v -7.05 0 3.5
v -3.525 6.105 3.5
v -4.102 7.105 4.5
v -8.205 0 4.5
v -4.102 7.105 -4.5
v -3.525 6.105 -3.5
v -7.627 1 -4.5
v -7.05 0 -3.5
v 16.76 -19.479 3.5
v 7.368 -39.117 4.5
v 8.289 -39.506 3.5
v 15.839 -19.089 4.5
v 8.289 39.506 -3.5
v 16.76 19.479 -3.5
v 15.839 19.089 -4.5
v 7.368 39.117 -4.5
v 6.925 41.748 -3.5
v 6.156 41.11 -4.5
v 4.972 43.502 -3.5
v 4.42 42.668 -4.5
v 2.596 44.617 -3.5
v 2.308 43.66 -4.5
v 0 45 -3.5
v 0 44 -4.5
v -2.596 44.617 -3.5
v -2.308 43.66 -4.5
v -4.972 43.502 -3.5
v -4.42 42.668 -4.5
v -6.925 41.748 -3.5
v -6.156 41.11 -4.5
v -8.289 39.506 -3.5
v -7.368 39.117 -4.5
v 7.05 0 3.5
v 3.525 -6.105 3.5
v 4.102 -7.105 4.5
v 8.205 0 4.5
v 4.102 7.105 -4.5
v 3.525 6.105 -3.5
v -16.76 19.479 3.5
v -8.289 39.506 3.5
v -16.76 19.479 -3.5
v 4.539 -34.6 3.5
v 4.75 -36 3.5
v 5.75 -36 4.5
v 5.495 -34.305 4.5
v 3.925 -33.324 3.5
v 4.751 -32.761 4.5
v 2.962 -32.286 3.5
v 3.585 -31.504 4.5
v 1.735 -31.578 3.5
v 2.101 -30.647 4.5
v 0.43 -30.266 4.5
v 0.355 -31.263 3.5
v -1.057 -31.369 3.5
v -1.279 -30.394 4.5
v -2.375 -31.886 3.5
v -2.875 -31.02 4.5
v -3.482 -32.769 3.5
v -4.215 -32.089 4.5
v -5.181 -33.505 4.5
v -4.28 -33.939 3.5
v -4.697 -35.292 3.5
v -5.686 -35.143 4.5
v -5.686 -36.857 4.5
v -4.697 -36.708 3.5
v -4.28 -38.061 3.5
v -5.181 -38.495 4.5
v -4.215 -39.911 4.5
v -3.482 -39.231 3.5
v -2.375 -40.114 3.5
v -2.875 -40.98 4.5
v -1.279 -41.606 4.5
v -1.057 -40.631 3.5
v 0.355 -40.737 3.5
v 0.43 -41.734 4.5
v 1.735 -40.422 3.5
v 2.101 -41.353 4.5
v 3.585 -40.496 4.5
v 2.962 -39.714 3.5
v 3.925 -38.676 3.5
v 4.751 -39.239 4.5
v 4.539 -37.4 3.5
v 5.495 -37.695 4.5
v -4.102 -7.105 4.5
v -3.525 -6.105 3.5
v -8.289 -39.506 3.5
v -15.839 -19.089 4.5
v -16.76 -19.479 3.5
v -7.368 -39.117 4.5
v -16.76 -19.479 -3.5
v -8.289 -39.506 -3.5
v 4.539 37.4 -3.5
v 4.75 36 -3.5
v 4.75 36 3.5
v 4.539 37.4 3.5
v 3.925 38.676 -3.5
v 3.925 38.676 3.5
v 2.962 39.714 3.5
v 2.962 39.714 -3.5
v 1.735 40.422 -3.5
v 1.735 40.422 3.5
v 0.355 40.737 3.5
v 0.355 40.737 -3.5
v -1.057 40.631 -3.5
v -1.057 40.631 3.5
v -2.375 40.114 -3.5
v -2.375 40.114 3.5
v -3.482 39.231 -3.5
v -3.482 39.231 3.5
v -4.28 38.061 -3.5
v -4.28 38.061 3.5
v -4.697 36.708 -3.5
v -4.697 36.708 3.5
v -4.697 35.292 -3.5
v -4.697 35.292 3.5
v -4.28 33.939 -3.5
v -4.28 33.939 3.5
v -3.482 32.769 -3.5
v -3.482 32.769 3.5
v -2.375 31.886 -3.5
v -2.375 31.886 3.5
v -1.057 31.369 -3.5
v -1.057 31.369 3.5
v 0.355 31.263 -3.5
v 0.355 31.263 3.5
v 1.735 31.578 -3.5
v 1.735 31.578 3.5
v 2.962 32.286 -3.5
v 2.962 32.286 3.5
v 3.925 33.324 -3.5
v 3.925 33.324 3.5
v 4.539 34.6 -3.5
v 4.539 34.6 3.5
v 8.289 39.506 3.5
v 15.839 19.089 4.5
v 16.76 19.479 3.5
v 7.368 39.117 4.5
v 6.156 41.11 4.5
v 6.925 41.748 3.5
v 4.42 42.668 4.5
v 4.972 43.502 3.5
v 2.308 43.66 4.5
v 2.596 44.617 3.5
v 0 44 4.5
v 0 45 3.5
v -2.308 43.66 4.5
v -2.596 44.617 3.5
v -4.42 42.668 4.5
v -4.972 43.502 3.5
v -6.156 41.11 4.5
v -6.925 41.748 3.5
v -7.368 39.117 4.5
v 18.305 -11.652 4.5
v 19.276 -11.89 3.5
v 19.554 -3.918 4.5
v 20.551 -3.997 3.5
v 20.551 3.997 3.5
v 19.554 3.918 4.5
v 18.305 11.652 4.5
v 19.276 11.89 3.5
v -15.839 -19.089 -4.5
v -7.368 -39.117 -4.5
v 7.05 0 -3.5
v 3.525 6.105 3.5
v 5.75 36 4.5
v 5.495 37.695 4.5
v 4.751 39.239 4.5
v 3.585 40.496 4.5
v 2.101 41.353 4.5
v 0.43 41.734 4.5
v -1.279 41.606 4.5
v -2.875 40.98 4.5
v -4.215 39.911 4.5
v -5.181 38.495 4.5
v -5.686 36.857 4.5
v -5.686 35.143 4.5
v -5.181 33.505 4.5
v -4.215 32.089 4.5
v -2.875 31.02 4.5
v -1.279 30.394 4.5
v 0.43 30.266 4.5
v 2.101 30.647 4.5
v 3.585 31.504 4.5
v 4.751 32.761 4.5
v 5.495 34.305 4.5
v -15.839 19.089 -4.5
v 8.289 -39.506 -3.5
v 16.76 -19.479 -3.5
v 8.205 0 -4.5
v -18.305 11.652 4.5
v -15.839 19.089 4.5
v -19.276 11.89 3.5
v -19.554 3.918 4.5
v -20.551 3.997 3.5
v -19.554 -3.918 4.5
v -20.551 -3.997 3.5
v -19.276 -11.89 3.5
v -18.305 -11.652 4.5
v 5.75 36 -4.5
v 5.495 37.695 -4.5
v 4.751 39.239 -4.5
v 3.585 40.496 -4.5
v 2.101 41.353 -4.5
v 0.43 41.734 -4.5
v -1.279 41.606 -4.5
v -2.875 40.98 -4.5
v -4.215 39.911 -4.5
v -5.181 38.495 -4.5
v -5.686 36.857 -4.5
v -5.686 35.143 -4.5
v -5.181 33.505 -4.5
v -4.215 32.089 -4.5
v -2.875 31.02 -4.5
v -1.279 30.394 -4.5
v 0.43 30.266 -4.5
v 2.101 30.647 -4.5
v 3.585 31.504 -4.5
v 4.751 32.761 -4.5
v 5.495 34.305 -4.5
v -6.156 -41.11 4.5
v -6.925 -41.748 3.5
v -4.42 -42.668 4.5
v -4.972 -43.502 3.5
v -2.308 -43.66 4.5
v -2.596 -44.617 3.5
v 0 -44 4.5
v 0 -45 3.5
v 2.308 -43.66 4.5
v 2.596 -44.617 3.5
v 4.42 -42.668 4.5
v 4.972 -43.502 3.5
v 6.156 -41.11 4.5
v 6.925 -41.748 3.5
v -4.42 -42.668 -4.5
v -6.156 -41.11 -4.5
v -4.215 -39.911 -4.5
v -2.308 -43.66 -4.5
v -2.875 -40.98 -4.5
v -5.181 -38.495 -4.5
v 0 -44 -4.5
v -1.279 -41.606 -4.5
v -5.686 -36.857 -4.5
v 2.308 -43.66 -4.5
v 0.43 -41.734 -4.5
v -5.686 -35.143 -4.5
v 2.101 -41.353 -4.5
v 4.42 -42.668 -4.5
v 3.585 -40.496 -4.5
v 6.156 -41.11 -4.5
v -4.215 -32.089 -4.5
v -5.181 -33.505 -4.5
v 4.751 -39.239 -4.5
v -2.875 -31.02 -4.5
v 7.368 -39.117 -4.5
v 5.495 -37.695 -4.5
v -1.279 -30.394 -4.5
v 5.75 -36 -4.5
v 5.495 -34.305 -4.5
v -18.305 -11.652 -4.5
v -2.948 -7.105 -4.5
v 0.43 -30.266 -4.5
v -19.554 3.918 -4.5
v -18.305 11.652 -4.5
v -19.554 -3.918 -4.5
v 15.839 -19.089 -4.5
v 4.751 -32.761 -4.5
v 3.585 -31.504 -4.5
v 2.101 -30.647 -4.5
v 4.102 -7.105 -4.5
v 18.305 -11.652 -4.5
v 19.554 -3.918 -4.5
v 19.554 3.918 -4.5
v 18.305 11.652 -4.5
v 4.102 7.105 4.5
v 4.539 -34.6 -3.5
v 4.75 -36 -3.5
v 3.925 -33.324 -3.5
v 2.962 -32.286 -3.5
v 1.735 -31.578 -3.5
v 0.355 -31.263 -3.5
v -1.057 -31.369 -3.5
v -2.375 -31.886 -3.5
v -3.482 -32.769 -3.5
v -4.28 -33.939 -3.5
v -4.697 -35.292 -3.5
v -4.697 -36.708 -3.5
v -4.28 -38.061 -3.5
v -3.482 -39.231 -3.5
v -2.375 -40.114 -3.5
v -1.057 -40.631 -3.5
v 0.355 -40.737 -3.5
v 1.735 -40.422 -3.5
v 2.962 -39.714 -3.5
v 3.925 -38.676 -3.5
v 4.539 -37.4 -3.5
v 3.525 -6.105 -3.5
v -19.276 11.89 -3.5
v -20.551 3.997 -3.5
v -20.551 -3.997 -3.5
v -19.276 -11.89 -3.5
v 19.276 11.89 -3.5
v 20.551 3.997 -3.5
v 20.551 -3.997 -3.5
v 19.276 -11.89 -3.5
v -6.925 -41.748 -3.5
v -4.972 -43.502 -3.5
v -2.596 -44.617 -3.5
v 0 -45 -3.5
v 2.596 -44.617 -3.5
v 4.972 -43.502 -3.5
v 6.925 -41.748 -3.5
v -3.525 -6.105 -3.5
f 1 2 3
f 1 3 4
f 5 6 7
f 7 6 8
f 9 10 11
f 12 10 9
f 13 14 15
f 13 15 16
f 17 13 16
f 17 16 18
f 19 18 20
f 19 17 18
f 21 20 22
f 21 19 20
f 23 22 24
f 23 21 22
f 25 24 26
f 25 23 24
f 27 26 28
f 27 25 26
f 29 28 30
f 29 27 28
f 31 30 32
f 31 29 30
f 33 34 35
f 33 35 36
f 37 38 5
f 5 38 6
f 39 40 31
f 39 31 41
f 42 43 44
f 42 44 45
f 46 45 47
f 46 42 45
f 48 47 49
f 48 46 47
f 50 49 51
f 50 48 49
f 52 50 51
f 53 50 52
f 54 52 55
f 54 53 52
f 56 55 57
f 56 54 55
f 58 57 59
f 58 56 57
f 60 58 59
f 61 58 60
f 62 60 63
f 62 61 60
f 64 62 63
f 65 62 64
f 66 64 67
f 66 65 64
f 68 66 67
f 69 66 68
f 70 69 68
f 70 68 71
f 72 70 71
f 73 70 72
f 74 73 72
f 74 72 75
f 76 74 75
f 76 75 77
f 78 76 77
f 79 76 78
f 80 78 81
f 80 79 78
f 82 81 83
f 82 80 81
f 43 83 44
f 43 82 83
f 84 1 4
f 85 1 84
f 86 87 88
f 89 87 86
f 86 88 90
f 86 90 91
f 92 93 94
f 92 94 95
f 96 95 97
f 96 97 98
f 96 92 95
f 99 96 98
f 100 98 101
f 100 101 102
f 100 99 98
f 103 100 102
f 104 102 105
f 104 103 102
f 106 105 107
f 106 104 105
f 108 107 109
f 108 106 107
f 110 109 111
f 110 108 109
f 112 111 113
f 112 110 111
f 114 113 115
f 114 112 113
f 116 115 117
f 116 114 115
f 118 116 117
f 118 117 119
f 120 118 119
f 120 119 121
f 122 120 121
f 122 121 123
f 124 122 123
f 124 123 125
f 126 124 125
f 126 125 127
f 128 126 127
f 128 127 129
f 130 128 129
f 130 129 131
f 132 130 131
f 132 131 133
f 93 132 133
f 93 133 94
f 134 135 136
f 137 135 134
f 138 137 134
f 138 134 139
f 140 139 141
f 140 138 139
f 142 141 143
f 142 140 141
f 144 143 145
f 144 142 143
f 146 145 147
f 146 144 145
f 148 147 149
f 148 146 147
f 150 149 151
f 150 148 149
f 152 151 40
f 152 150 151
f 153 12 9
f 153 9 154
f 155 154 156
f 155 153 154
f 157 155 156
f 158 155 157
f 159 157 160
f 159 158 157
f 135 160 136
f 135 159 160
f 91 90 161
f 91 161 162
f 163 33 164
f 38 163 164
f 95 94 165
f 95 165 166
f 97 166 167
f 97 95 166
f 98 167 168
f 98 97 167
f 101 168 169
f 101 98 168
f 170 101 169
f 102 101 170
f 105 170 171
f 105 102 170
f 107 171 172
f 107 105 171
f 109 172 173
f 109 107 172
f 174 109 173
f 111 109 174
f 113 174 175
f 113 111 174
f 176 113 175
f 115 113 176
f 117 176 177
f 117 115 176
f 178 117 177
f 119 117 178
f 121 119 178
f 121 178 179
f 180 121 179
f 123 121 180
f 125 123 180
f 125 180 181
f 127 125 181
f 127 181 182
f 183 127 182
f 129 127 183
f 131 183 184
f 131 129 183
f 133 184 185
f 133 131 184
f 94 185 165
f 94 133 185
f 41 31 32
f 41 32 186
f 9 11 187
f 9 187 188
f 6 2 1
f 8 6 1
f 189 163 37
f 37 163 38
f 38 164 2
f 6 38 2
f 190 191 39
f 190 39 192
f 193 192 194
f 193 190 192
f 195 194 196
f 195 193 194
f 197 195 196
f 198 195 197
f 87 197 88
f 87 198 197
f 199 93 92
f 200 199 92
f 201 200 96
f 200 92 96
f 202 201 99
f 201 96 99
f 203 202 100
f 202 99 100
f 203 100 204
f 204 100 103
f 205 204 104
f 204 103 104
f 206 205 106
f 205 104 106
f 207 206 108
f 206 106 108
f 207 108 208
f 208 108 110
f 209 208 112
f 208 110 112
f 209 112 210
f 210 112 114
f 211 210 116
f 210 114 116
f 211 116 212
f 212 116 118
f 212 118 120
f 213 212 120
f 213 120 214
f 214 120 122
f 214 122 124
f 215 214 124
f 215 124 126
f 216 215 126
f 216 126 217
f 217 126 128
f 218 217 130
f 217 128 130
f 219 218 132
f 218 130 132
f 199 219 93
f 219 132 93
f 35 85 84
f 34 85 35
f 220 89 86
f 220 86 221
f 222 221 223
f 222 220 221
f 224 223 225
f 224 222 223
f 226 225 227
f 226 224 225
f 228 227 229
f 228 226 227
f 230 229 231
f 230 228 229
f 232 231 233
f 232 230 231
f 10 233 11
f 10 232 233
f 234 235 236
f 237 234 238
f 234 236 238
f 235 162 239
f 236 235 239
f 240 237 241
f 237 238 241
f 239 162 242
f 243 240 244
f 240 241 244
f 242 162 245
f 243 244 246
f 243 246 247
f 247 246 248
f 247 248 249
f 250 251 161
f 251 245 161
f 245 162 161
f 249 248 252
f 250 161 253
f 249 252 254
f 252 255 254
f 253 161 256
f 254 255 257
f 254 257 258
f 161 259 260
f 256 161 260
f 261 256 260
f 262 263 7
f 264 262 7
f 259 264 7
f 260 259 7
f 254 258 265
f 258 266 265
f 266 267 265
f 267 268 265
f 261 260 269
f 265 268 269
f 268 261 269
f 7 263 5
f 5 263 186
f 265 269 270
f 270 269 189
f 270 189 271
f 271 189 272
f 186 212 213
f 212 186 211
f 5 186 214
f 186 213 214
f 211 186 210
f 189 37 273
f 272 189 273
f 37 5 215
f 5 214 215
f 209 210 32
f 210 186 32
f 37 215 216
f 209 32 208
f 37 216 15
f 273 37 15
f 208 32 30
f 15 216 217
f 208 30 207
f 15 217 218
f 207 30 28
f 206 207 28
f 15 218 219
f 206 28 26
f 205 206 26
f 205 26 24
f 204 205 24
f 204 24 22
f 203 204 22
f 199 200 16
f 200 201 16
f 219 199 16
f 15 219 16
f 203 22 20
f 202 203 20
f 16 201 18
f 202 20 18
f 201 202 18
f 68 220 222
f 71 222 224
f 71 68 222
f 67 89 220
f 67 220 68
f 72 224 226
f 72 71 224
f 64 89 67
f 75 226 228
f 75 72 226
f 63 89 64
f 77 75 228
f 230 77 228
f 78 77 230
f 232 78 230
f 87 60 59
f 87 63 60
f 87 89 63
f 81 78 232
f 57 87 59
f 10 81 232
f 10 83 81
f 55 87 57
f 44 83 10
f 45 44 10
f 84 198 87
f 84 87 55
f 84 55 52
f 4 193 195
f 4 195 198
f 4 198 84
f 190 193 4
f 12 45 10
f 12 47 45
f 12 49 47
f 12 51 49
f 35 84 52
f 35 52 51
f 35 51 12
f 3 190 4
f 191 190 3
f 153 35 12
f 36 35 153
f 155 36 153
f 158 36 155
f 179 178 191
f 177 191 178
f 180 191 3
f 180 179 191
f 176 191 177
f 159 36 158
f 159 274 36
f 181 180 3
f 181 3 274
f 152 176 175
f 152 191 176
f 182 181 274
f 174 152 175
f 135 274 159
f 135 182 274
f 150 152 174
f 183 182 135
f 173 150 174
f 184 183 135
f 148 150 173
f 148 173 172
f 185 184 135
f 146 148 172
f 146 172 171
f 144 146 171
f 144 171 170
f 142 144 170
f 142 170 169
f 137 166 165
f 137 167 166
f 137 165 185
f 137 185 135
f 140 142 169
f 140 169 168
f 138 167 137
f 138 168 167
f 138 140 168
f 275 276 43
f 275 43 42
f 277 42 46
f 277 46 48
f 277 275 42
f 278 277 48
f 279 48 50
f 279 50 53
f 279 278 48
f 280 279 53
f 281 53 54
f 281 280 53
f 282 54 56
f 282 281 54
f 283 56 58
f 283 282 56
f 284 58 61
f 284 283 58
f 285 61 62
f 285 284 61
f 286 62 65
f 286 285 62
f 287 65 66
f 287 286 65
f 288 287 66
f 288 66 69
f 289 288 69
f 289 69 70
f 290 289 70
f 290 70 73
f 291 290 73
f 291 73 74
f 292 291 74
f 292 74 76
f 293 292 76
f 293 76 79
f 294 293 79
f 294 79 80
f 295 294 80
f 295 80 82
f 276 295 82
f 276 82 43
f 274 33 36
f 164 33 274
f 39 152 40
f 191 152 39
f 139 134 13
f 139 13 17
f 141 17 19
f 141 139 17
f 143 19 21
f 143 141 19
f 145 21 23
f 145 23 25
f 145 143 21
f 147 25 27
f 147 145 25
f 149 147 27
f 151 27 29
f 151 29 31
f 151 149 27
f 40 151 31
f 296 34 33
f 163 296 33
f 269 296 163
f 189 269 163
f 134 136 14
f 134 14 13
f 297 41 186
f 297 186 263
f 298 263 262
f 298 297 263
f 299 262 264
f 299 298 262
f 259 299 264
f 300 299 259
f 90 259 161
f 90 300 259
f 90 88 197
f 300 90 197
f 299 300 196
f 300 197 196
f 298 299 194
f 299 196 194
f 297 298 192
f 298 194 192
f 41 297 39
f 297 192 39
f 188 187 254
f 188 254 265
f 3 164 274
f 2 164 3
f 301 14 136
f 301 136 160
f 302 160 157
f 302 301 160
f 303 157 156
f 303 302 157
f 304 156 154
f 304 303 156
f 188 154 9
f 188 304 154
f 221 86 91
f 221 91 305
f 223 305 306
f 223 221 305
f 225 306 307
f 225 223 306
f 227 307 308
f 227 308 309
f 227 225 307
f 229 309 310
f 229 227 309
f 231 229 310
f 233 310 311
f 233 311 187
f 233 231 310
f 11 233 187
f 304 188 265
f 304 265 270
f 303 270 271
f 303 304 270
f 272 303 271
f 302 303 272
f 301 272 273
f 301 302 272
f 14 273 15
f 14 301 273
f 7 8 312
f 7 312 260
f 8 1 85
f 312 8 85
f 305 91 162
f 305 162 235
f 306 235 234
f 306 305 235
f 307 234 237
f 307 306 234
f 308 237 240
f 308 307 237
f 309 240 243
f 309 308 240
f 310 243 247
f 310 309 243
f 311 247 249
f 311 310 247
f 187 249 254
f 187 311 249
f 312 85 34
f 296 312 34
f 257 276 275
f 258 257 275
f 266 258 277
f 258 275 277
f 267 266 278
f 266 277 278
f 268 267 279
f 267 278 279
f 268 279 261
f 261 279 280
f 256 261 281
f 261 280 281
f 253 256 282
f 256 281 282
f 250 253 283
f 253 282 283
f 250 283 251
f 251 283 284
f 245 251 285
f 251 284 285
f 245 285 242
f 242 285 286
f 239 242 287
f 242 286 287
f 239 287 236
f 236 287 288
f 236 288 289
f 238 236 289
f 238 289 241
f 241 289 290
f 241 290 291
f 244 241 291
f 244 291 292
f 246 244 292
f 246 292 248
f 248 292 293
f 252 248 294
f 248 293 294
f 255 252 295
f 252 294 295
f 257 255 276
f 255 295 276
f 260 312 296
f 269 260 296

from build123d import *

# Parameters (mm, degrees)
F0_R     = 4.75
F1_DEPTH = 4.5
F2_R     = 50
F3_SIZE  = 1
F5_DEPTH = 25
F6_SIZE  = 1


with BuildPart() as f1:
    # F0 (on Top) → F1 (new body, symmetric)
    with BuildSketch(Plane.XY):
        with BuildLine():
            Line((25, 0), (8.288939, 39.506208))
            ThreePointArc((8.288939, 39.506208), (0, 45), (-8.288939, 39.506208))
            Line((-8.288939, 39.506208), (-25, 0))
            Line((-25, 0), (-8.288939, -39.506208))
            ThreePointArc((-8.288939, -39.506208), (0, -45), (8.288939, -39.506208))
            Line((8.288939, -39.506208), (25, 0))
        make_face()
        with Locations((0, -36)):
            Circle(F0_R, mode=Mode.SUBTRACT)
        with Locations((0, 36)):
            Circle(F0_R, mode=Mode.SUBTRACT)
    extrude(amount=F1_DEPTH, both=True)

    # F2
    f2_edges = [f1.edges().sort_by_distance(p)[0] for p in [
        (-25, 0, 0),
        (25, 0, 0),
    ]]
    fillet(f2_edges, radius=F2_R)

    # F3
    f3_edges = [f1.edges().sort_by_distance(p)[0] for p in [
        (0, 45, 4.5),
        (0, 45, -4.5),
        (-12.524692, -29.492569, 4.5),
        (-12.524692, -29.492569, -4.5),
    ]]
    chamfer(f3_edges, length=F3_SIZE)

    # F4 (on face) → F5 (cut)
    with BuildSketch(Plane.XY.offset(4.5)):
        Polygon((-3.525, 6.105479), (-7.05, 0), (-3.525, -6.105479), (3.525, -6.105479), (7.05, 0), (3.525, 6.105479), align=None)
    extrude(amount=-F5_DEPTH, mode=Mode.SUBTRACT)

    # F6
    f6_edges = [f1.edges().sort_by_distance(p)[0] for p in [
        (-4.75, 36, 4.5),
        (-4.75, 36, -4.5),
        (-4.75, -36, 4.5),
        (-4.75, -36, -4.5),
        (0, -6.105479, 4.5),
        (-5.2875, -3.05274, 4.5),
        (-5.2875, 3.05274, 4.5),
        (0, 6.105479, 4.5),
        (5.2875, 3.05274, 4.5),
        (5.2875, -3.05274, 4.5),
        (0, -6.105479, -4.5),
        (5.2875, -3.05274, -4.5),
        (5.2875, 3.05274, -4.5),
        (0, 6.105479, -4.5),
        (-5.2875, 3.05274, -4.5),
    ]]
    chamfer(f6_edges, length=F6_SIZE)


solid = f1.part
